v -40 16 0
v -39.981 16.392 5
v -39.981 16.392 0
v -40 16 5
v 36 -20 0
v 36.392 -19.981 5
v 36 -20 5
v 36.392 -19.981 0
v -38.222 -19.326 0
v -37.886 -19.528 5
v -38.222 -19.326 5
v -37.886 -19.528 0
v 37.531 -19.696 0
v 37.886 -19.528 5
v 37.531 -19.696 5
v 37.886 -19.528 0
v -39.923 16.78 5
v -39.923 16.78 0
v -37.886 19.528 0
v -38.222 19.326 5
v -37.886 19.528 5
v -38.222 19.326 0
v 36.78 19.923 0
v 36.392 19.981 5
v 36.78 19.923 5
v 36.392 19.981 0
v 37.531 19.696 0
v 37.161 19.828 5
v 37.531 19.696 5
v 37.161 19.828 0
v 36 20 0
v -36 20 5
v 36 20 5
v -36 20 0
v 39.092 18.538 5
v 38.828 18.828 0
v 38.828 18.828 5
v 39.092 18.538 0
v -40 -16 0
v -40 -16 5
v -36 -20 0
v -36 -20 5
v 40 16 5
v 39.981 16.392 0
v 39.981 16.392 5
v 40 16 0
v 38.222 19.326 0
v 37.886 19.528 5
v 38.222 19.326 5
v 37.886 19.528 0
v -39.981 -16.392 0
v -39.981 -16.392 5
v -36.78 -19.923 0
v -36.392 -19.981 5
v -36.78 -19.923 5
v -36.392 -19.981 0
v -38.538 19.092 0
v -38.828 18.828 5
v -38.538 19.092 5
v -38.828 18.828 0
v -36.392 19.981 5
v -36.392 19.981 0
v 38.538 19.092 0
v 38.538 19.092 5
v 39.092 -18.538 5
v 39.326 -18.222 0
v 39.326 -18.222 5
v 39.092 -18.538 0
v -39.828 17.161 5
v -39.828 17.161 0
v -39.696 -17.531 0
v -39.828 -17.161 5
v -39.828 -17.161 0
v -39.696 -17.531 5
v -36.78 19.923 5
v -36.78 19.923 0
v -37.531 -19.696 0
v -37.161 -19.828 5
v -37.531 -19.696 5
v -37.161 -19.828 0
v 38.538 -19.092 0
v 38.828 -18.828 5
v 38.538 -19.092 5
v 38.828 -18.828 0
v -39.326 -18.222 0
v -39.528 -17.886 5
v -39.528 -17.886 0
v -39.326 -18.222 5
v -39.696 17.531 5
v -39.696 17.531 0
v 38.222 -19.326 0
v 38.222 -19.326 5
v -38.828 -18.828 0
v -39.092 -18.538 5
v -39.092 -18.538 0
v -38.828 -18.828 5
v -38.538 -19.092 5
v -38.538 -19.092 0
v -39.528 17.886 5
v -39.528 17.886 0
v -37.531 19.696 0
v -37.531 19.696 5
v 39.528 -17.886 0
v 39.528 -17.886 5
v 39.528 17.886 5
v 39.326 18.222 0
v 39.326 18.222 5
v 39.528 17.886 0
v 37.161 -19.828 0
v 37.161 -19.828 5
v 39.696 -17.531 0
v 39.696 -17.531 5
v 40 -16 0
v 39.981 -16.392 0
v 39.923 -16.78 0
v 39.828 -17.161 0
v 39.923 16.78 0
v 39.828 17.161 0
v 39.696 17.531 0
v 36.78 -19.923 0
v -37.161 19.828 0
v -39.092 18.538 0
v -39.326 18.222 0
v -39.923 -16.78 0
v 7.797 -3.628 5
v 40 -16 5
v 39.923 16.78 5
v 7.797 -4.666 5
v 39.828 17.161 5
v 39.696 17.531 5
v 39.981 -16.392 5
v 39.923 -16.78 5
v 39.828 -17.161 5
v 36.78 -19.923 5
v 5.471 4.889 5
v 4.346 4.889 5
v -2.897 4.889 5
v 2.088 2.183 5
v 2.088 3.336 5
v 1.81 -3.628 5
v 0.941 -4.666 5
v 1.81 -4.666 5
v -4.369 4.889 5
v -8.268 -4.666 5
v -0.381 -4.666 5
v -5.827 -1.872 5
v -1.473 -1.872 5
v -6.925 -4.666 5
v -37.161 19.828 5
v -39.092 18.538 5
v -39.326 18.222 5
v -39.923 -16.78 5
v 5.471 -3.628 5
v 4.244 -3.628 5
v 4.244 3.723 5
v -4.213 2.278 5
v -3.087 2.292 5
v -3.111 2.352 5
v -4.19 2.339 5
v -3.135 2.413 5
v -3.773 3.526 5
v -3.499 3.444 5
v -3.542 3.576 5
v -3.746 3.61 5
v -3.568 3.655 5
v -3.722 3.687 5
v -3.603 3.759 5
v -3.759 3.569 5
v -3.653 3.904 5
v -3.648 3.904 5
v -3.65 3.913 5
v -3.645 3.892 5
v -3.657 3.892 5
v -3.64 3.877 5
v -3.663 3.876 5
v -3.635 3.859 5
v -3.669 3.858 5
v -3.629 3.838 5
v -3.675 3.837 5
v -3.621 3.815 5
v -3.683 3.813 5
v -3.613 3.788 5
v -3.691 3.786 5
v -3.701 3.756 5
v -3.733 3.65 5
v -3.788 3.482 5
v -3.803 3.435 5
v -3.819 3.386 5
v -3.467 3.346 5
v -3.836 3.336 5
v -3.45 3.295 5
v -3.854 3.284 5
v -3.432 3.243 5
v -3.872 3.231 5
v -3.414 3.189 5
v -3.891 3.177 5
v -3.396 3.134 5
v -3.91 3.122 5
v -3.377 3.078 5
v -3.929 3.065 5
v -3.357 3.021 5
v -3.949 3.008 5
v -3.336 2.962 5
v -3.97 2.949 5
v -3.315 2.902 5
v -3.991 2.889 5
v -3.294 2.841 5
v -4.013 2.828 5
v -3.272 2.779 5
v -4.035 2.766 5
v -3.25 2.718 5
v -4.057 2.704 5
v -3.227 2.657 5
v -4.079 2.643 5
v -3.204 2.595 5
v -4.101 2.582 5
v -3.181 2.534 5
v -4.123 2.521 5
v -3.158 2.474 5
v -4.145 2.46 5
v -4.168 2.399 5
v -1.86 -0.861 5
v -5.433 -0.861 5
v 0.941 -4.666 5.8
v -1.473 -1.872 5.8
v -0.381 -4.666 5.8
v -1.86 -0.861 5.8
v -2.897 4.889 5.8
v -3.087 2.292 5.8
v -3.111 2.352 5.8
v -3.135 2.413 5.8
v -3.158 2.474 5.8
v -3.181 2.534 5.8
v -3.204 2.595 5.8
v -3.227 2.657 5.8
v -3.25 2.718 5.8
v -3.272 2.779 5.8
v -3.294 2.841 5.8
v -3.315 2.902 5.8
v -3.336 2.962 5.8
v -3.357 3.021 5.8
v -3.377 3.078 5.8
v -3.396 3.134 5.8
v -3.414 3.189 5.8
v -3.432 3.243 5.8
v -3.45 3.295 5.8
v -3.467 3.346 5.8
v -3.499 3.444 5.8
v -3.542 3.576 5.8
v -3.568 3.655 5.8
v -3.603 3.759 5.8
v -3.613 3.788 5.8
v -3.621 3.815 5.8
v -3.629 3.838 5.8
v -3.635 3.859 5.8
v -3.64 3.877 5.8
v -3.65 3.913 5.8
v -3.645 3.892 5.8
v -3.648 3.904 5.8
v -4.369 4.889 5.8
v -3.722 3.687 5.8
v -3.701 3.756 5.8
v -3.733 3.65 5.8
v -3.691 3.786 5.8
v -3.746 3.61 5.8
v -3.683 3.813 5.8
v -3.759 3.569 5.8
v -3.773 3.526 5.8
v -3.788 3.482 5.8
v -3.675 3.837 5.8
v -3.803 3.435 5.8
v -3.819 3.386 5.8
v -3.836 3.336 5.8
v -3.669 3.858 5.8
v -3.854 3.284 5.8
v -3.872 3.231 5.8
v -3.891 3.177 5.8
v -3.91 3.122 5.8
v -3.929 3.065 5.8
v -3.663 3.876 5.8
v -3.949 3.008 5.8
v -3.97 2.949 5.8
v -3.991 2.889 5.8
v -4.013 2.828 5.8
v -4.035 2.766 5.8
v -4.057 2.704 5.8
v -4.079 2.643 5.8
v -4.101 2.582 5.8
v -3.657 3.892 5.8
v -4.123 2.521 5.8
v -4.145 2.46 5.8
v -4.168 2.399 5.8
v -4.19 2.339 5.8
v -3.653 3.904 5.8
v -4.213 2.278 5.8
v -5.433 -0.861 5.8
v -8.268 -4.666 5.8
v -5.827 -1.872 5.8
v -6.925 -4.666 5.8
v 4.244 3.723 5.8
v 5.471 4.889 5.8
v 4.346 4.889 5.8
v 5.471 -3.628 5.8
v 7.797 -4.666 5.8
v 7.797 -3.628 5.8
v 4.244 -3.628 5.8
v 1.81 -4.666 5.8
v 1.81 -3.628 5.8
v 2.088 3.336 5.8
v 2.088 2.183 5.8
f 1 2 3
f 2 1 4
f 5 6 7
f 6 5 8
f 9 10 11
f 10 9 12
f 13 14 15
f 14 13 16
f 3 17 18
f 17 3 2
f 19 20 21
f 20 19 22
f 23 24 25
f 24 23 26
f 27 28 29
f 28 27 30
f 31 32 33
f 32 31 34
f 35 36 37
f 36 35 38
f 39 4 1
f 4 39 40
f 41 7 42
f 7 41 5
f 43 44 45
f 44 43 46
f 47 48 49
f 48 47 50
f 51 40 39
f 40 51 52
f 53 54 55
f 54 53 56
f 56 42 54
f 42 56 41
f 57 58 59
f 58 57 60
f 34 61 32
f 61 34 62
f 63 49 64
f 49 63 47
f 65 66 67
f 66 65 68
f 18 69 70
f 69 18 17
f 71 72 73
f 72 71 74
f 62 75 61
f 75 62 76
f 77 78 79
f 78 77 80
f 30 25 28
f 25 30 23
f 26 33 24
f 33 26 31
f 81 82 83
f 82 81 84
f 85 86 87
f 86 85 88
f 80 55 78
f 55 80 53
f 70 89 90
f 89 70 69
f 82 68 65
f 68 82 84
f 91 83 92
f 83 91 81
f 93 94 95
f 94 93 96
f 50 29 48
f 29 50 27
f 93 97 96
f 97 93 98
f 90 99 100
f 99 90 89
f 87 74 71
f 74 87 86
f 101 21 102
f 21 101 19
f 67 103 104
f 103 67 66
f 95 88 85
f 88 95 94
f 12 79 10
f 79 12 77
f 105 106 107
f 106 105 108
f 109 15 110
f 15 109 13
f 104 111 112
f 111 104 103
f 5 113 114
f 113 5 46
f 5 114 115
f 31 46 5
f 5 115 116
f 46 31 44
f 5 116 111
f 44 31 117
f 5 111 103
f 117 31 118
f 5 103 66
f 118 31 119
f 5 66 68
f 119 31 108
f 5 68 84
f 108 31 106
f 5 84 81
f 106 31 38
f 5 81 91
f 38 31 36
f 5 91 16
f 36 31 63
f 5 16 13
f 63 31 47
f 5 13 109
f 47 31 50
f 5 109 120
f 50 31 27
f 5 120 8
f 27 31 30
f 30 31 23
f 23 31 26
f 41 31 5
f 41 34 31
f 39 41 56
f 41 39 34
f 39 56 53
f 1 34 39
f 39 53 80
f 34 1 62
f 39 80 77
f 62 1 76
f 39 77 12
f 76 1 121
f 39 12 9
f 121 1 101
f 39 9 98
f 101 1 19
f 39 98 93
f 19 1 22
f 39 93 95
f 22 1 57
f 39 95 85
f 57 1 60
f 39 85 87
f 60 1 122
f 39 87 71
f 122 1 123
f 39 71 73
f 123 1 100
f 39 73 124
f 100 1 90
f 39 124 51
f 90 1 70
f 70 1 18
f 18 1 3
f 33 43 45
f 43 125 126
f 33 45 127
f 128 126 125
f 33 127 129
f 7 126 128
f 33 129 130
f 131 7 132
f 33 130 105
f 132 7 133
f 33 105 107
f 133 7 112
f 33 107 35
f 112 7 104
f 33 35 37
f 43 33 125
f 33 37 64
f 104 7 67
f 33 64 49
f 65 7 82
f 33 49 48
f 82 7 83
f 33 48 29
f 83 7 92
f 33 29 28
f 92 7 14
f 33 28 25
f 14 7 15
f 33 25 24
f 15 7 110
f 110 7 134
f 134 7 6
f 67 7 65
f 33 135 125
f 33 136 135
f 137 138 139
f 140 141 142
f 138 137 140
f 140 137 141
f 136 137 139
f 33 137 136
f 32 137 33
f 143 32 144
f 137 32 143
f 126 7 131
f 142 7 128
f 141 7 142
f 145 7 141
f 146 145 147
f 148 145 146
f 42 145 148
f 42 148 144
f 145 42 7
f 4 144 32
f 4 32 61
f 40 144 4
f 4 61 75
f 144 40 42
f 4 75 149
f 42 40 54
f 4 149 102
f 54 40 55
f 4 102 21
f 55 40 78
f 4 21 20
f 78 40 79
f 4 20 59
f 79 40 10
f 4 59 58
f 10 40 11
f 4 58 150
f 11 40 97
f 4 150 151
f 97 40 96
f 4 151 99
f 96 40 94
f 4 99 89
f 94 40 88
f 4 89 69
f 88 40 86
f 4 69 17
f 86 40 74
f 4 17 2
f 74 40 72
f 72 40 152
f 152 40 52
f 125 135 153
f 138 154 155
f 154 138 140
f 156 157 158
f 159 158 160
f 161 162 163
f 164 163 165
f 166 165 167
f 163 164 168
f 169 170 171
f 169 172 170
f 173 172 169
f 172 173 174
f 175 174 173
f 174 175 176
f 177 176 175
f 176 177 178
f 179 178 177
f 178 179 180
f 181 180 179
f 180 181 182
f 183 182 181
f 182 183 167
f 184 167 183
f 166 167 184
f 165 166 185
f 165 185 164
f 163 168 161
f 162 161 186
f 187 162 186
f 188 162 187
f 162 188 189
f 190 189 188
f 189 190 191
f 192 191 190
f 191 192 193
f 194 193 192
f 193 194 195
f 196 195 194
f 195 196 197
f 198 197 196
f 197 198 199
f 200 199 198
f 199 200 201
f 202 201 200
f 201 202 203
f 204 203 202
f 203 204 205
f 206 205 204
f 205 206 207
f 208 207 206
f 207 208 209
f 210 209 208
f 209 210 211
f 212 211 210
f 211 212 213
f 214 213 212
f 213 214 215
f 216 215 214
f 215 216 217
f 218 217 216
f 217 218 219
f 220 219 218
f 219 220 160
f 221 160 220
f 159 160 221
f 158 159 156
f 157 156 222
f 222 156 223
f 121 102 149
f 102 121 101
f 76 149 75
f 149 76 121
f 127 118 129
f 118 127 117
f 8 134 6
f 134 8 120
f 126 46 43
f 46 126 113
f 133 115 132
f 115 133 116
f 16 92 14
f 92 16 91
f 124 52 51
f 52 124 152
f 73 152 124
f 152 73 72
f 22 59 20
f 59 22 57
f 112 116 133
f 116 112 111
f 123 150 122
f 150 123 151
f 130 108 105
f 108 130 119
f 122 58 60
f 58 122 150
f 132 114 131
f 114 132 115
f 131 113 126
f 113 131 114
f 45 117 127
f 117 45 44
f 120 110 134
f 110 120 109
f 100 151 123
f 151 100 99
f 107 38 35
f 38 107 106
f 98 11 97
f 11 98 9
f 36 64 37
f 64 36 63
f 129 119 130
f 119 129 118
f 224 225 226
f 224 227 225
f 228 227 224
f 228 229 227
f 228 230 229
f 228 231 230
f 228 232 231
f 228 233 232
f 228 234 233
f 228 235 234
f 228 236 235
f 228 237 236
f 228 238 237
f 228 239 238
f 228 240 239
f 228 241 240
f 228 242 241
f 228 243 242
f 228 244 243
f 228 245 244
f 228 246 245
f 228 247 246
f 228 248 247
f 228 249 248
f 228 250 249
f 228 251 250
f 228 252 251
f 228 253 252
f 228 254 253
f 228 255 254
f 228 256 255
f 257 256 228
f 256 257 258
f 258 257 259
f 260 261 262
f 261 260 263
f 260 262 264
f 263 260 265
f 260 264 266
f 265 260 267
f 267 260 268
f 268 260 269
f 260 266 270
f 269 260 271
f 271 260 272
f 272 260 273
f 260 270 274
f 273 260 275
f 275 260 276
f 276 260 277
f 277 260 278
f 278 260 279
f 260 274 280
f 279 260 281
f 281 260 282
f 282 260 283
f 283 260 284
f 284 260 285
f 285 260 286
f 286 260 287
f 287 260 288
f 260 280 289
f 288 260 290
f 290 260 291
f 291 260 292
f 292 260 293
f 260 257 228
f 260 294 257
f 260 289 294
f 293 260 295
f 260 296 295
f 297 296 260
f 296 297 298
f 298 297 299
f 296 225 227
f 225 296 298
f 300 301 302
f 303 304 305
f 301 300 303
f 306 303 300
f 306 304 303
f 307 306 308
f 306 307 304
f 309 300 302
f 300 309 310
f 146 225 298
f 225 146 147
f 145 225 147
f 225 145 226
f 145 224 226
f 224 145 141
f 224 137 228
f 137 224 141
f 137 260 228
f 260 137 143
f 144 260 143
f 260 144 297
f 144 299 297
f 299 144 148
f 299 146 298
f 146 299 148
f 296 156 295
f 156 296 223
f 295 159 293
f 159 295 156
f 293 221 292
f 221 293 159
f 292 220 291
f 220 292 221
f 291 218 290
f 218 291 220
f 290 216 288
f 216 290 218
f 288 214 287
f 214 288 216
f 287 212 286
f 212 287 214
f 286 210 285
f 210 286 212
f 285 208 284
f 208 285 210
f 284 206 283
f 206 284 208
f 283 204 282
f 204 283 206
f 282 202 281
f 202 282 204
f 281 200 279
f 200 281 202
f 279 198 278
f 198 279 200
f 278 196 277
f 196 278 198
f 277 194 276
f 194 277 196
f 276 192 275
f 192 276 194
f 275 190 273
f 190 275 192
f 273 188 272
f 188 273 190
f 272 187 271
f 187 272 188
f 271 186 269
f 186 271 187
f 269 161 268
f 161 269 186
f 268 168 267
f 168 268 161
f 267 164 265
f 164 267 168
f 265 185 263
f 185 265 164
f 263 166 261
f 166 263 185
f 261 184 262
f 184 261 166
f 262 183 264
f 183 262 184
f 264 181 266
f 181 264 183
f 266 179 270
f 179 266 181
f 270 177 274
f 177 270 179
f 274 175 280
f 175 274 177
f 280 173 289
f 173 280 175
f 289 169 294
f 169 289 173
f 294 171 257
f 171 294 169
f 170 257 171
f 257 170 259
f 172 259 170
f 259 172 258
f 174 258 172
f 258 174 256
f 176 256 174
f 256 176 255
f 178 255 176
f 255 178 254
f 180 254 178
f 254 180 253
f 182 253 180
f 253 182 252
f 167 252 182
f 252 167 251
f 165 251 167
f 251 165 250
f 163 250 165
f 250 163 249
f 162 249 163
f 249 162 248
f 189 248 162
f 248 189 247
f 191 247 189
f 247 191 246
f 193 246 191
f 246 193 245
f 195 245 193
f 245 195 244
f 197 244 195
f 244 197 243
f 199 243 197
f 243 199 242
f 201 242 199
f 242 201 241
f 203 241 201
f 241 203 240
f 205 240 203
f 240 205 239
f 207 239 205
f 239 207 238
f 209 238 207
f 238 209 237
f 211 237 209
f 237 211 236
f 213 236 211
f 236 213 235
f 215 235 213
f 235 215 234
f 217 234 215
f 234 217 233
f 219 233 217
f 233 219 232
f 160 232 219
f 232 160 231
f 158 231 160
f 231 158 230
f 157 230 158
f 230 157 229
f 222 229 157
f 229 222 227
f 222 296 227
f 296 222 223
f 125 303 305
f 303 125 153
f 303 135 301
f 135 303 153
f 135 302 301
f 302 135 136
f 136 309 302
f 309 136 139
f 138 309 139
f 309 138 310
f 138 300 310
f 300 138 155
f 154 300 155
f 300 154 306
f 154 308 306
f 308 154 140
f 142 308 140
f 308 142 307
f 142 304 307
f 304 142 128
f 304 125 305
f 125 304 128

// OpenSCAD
/*
Model: Customizer-ready starter
Units: millimetres
Export: Render (F6), then export STL/3MF
*/

/* [Dimensions] */
part_w = 80; // [20:1:200]
part_d = 40; // [20:1:200]
part_t = 5; // [1:0.5:30]
corner_r = 4; // [0:0.5:20]

/* [Options] */
add_label = true;
label_text = "A1";
label_size = 10; // [4:1:30]
label_height = 0.8; // [0.2:0.1:3]

/* [Hidden] */
eps = 0.01;
$fn = 64;

safe_corner_r = min(corner_r, min(part_w, part_d) / 2 - eps);

assert(part_w > 0, "part_w must be positive");
assert(part_d > 0, "part_d must be positive");
assert(part_t > 0, "part_t must be positive");
assert(corner_r >= 0, "corner_r must be non-negative");
assert(safe_corner_r >= 0, "corner_r too large for part dimensions");

module rounded_rect_2d(w, d, r) {
    if (r <= eps)
        square([w, d], center = true);
    else
        offset(r = r)
            offset(delta = -r)
                square([w, d], center = true);
}

module base_body() {
    linear_extrude(height = part_t)
        rounded_rect_2d(part_w, part_d, safe_corner_r);
}

module label() {
    translate([0, 0, part_t - eps])
        linear_extrude(height = label_height + eps)
            text(label_text, size = label_size, halign = "center", valign = "center");
}

module model() {
    union() {
        base_body();
        if (add_label)
            label();
    }
}

model();
